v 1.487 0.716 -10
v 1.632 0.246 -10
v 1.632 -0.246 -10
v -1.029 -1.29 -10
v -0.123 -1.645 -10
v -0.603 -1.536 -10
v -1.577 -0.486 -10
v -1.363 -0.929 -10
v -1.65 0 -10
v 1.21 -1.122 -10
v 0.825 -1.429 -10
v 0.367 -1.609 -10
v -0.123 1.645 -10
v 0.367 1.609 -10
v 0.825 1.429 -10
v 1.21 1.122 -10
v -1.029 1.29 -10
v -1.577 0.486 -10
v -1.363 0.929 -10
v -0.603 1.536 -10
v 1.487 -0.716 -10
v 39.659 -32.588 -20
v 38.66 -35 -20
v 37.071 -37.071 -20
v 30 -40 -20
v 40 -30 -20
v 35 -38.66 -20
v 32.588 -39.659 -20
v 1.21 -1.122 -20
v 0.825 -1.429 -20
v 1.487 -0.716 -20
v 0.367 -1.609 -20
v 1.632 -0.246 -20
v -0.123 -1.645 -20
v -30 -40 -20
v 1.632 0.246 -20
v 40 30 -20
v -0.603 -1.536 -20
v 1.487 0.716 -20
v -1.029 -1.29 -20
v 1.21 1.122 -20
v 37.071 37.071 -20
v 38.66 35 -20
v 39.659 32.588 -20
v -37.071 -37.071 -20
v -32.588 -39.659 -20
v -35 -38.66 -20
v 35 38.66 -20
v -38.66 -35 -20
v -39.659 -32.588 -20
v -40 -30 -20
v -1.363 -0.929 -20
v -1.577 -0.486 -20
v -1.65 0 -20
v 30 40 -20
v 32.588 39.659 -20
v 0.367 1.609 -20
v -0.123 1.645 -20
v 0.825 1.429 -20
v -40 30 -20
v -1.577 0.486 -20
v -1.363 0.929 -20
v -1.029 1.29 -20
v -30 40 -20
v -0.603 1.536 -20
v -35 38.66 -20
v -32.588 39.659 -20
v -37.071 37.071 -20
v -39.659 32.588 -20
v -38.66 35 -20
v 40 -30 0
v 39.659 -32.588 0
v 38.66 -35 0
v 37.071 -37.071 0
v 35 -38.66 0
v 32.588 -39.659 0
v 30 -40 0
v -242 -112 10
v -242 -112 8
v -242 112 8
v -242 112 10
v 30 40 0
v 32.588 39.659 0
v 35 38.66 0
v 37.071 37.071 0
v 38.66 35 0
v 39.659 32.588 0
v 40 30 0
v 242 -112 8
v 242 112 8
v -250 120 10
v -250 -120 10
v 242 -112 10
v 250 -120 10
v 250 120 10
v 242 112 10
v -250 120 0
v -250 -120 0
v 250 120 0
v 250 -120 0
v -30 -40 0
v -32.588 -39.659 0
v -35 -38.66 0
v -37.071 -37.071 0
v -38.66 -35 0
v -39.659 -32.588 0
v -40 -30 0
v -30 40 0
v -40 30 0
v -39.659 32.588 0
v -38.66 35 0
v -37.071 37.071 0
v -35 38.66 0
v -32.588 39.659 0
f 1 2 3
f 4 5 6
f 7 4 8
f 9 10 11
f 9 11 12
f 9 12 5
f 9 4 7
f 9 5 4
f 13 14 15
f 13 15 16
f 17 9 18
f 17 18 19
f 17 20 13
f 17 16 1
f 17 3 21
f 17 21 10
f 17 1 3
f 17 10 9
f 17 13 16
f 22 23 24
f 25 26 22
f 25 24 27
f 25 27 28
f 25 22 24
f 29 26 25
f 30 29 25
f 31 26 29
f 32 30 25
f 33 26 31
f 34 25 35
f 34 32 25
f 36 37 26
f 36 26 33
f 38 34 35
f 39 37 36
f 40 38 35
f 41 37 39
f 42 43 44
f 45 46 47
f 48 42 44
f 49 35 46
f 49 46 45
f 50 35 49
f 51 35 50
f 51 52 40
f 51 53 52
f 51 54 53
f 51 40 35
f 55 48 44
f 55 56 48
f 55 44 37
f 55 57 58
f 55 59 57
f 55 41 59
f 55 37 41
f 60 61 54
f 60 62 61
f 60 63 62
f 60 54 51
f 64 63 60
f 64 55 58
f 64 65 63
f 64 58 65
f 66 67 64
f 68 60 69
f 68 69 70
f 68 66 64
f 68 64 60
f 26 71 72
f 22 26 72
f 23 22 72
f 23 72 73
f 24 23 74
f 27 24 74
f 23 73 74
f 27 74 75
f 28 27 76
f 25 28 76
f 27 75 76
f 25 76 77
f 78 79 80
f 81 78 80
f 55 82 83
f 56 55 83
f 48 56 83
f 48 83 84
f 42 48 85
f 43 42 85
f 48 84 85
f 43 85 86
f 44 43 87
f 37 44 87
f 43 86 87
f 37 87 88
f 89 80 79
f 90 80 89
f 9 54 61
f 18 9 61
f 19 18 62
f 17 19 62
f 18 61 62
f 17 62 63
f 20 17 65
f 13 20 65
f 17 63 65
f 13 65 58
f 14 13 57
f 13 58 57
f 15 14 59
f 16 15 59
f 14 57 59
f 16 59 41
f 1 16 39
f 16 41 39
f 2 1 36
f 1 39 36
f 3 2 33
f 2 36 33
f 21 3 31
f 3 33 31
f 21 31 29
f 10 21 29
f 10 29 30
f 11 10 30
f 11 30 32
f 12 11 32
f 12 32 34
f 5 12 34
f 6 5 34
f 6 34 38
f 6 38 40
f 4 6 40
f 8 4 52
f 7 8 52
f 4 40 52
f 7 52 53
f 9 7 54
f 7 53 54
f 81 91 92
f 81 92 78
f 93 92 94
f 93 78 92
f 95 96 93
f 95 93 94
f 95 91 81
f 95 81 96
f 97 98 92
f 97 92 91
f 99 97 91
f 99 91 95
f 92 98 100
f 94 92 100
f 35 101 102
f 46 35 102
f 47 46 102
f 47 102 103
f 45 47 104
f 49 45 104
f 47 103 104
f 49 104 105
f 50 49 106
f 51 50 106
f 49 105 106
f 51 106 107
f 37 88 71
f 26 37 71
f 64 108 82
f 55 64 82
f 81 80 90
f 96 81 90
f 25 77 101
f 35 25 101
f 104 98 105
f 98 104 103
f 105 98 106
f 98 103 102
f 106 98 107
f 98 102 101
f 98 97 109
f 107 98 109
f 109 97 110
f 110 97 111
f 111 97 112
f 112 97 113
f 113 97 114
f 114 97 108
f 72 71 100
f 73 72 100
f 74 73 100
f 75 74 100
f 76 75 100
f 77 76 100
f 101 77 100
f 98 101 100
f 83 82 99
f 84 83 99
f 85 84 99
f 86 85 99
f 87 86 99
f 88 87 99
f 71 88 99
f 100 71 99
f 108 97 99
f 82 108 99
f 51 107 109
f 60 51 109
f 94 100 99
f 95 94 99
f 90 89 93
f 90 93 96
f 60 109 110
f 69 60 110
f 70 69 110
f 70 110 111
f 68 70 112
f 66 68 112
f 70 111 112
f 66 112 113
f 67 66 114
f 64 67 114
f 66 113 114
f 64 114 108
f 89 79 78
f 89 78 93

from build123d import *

# Parameters (mm, degrees)
SKETCH_1_W          = 500
SKETCH_1_H          = 240
EXTRUDE_1_DEPTH     = 10
SHELL_1_T           = -8
EXTRUDE_2_DEPTH     = 20
SKETCH_9_R          = 1.65
CUT_EXTRUDE_1_DEPTH = 10


with BuildPart() as part:
    # 草圖1 → 填料-伸長1 (new body)
    with BuildSketch(Plane.XY):
        Rectangle(SKETCH_1_W, SKETCH_1_H)
    extrude(amount=EXTRUDE_1_DEPTH)

    # 薄殼1
    shell_1_openings = [part.faces().sort_by_distance(p)[0] for p in [
        (0, 0, 10),
    ]]
    offset(amount=SHELL_1_T, openings=shell_1_openings, kind=Kind.INTERSECTION)

    # 草圖2 → 填料-伸長2 (add)
    with BuildSketch(Plane(origin=(0, 0, 0), x_dir=(-1, 0, 0), z_dir=(0, 0, -1))):
        with BuildLine():
            Line((-30, -40), (30, -40))
            ThreePointArc((30, -40), (37.071067812, -37.071067812), (40, -30))
            Line((40, -30), (40, 30))
            ThreePointArc((40, 30), (37.071067812, 37.071067812), (30, 40))
            Line((30, 40), (-30, 40))
            ThreePointArc((-30, 40), (-37.071067812, 37.071067812), (-40, 30))
            Line((-40, 30), (-40, -30))
            ThreePointArc((-40, -30), (-37.071067812, -37.071067812), (-30, -40))
        make_face()
    extrude(amount=EXTRUDE_2_DEPTH)

    # 草圖9 → 除料-伸長1 (cut)
    with BuildSketch(Plane(origin=(0, 0, -20), x_dir=(-1, 0, 0), z_dir=(0, 0, -1))):
        Circle(SKETCH_9_R)
    extrude(amount=-CUT_EXTRUDE_1_DEPTH, mode=Mode.SUBTRACT)


solid = part.part
